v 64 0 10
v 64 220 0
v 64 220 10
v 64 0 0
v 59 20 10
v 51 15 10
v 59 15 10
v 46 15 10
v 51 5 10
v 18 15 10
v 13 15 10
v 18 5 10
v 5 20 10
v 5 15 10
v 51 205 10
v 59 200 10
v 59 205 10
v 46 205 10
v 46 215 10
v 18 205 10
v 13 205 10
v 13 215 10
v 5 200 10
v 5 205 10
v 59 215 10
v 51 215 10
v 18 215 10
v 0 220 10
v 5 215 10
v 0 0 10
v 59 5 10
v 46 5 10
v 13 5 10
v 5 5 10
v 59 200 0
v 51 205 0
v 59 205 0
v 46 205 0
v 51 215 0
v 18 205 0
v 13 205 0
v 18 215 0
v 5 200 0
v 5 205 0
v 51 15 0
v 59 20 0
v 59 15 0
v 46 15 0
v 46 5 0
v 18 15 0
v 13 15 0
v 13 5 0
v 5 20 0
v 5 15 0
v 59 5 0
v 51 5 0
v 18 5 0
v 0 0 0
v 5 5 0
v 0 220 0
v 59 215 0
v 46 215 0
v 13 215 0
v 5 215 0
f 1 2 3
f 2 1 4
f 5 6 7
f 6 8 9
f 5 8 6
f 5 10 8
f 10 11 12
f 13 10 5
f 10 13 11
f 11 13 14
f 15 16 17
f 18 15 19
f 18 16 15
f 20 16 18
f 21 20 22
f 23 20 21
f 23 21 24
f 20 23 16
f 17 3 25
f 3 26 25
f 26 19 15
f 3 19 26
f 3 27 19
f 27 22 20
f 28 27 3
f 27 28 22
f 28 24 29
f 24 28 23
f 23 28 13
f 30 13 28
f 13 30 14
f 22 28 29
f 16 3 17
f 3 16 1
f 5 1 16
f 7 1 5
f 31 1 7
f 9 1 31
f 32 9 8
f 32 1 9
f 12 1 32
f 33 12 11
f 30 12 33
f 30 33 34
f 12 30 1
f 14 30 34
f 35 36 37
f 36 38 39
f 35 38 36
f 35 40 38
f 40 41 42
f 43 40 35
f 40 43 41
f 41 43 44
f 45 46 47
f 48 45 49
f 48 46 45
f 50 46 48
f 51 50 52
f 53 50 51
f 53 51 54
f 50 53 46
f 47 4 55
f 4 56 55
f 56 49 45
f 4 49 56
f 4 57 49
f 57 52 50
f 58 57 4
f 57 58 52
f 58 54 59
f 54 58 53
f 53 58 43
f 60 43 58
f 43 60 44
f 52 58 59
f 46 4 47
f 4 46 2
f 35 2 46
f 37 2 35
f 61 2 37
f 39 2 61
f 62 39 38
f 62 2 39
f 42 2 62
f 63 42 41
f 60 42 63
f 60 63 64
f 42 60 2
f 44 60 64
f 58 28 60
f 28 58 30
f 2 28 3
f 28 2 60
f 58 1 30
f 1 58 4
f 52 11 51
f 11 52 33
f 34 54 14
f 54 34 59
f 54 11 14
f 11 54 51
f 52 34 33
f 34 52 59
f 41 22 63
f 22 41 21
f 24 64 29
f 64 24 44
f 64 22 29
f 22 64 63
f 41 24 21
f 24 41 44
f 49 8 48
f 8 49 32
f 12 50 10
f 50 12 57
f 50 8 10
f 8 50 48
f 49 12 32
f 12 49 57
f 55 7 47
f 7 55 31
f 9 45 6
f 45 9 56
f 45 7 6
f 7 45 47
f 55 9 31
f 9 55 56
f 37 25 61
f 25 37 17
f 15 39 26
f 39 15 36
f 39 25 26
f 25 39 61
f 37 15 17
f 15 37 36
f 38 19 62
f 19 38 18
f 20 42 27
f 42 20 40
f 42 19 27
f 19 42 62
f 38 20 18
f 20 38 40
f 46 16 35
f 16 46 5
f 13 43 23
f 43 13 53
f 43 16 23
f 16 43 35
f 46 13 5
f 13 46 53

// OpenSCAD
// file: config.scad
$fa = 1;
$fs = 0.2;

bearing_outer_dia = 22;
bearing_inner_dia = 10;
bearing_padding = 8;

casing_width = 10;

post_height = 100;
post_base_height = 20;
post_groove_width = 4;
post_groove_depth = 4;
post_groove_offset = 4;

base_margin = 5;
post_base_width = casing_width;
post_length = 2*(post_groove_offset + post_groove_depth + bearing_padding) + bearing_outer_dia;
post_separation = 210;

base_length = post_length + 2 * base_margin;
base_width = post_separation + 2 * base_margin;
base_height = 10;

// groove to groove distance
casing_length = 2*(post_groove_depth + bearing_padding) + bearing_outer_dia;
casing_height = 1.5 * bearing_padding + bearing_outer_dia;

roller_width = 200;
roller_padding = post_separation - roller_width;
roller_stem_protrusion = 20;
roller_groove_toroid_radius = 2;
roller_stem_depth = 50;
// main file
include <config.scad>

difference() {
    cube([base_length, base_width, base_height]);
    translate([base_margin, base_margin, 0])
        cube([post_groove_offset + post_groove_depth, post_base_width, post_base_height]);
    translate([base_margin, base_width - base_margin - post_base_width, 0])
        cube([post_groove_offset + post_groove_depth, post_base_width, post_base_height]);
    
    translate([2*base_margin + post_groove_offset + post_groove_depth, base_margin, 0])
        cube([base_length - 2*(post_groove_offset + post_groove_depth + 2*base_margin), post_base_width, post_base_height]);
    
    translate([base_length - base_margin - post_groove_offset - post_groove_depth, base_margin, 0])
        cube([post_groove_offset + post_groove_depth, post_base_width, post_base_height]);
    translate([base_length - base_margin - post_groove_offset - post_groove_depth, base_width - base_margin - post_base_width, 0])
        cube([post_groove_offset + post_groove_depth, post_base_width, post_base_height]);
    translate([2*base_margin + post_groove_offset + post_groove_depth, base_width - base_margin - post_base_width, 0])
        cube([base_length - 2*(post_groove_offset + post_groove_depth + 2*base_margin), post_base_width, post_base_height]);
    
    translate([base_margin, 2* base_margin + post_base_width, 0])
        cube([post_length, base_width - 4*base_margin - 2*post_base_width, post_height - post_base_height]);
}
